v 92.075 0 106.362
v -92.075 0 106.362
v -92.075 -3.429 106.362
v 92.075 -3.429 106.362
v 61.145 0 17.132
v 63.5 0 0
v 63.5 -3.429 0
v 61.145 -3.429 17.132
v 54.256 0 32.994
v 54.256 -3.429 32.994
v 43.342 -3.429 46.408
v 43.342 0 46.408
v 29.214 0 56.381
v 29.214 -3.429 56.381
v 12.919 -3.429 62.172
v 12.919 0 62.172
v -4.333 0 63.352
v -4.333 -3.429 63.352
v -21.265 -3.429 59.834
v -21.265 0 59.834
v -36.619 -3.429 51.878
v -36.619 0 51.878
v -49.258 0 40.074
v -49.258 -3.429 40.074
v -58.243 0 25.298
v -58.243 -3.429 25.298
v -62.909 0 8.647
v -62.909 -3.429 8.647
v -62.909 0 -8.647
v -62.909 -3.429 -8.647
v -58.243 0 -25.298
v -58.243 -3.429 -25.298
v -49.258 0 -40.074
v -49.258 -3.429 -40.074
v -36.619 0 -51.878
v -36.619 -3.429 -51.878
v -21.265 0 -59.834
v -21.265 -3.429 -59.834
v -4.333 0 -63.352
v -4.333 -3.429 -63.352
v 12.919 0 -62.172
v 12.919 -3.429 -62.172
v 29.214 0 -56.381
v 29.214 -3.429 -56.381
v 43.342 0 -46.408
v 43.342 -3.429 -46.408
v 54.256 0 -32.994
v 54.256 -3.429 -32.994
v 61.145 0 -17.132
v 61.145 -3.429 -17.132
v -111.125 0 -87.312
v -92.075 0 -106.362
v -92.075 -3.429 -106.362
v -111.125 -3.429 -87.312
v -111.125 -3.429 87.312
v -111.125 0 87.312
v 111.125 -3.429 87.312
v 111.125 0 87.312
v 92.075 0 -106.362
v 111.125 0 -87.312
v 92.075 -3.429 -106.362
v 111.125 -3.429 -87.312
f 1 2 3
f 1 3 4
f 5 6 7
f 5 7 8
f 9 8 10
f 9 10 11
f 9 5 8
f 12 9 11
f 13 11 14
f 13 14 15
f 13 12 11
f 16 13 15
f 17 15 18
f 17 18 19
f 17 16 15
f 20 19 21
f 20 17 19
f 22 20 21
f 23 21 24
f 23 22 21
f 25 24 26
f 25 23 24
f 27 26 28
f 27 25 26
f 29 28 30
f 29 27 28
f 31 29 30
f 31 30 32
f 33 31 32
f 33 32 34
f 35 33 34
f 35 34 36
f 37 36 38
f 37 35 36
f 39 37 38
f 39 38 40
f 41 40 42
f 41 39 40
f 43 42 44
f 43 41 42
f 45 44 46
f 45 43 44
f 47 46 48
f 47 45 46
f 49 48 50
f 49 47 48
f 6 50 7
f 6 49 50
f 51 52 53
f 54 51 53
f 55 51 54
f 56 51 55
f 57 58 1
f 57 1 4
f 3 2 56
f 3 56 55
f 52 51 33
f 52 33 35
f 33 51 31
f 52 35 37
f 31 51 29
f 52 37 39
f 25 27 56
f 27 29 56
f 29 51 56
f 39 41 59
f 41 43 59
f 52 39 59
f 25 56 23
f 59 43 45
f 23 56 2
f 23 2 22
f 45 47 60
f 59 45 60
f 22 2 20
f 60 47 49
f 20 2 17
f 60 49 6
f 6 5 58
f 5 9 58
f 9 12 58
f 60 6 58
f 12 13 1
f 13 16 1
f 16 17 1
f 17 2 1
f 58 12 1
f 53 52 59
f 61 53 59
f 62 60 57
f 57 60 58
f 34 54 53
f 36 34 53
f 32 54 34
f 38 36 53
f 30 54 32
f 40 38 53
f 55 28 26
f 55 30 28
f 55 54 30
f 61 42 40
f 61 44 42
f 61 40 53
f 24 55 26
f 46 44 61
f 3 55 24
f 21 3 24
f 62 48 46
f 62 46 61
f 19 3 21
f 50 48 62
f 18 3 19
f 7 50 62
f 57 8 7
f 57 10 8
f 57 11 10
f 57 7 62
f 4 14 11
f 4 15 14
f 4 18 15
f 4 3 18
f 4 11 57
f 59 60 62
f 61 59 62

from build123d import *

# Parameters (mm, degrees)
F0_W     = 222.25
F0_H     = 212.725
F0_R     = 63.5
F1_DEPTH = 3.429
F2_SIZE  = 19.05


with BuildPart() as f1:
    # F0 (on Front) → F1 (new body)
    with BuildSketch(Plane.XZ):
        Rectangle(F0_W, F0_H)
        Circle(F0_R, mode=Mode.SUBTRACT)
    extrude(amount=F1_DEPTH)

    # F2
    f2_edges = [f1.edges().sort_by_distance(p)[0] for p in [
        (-111.125, -1.7145, 106.3625),
        (111.125, -1.7145, 106.3625),
        (-111.125, -1.7145, -106.3625),
        (111.125, -1.7145, -106.3625),
    ]]
    chamfer(f2_edges, length=F2_SIZE)


solid = f1.part
